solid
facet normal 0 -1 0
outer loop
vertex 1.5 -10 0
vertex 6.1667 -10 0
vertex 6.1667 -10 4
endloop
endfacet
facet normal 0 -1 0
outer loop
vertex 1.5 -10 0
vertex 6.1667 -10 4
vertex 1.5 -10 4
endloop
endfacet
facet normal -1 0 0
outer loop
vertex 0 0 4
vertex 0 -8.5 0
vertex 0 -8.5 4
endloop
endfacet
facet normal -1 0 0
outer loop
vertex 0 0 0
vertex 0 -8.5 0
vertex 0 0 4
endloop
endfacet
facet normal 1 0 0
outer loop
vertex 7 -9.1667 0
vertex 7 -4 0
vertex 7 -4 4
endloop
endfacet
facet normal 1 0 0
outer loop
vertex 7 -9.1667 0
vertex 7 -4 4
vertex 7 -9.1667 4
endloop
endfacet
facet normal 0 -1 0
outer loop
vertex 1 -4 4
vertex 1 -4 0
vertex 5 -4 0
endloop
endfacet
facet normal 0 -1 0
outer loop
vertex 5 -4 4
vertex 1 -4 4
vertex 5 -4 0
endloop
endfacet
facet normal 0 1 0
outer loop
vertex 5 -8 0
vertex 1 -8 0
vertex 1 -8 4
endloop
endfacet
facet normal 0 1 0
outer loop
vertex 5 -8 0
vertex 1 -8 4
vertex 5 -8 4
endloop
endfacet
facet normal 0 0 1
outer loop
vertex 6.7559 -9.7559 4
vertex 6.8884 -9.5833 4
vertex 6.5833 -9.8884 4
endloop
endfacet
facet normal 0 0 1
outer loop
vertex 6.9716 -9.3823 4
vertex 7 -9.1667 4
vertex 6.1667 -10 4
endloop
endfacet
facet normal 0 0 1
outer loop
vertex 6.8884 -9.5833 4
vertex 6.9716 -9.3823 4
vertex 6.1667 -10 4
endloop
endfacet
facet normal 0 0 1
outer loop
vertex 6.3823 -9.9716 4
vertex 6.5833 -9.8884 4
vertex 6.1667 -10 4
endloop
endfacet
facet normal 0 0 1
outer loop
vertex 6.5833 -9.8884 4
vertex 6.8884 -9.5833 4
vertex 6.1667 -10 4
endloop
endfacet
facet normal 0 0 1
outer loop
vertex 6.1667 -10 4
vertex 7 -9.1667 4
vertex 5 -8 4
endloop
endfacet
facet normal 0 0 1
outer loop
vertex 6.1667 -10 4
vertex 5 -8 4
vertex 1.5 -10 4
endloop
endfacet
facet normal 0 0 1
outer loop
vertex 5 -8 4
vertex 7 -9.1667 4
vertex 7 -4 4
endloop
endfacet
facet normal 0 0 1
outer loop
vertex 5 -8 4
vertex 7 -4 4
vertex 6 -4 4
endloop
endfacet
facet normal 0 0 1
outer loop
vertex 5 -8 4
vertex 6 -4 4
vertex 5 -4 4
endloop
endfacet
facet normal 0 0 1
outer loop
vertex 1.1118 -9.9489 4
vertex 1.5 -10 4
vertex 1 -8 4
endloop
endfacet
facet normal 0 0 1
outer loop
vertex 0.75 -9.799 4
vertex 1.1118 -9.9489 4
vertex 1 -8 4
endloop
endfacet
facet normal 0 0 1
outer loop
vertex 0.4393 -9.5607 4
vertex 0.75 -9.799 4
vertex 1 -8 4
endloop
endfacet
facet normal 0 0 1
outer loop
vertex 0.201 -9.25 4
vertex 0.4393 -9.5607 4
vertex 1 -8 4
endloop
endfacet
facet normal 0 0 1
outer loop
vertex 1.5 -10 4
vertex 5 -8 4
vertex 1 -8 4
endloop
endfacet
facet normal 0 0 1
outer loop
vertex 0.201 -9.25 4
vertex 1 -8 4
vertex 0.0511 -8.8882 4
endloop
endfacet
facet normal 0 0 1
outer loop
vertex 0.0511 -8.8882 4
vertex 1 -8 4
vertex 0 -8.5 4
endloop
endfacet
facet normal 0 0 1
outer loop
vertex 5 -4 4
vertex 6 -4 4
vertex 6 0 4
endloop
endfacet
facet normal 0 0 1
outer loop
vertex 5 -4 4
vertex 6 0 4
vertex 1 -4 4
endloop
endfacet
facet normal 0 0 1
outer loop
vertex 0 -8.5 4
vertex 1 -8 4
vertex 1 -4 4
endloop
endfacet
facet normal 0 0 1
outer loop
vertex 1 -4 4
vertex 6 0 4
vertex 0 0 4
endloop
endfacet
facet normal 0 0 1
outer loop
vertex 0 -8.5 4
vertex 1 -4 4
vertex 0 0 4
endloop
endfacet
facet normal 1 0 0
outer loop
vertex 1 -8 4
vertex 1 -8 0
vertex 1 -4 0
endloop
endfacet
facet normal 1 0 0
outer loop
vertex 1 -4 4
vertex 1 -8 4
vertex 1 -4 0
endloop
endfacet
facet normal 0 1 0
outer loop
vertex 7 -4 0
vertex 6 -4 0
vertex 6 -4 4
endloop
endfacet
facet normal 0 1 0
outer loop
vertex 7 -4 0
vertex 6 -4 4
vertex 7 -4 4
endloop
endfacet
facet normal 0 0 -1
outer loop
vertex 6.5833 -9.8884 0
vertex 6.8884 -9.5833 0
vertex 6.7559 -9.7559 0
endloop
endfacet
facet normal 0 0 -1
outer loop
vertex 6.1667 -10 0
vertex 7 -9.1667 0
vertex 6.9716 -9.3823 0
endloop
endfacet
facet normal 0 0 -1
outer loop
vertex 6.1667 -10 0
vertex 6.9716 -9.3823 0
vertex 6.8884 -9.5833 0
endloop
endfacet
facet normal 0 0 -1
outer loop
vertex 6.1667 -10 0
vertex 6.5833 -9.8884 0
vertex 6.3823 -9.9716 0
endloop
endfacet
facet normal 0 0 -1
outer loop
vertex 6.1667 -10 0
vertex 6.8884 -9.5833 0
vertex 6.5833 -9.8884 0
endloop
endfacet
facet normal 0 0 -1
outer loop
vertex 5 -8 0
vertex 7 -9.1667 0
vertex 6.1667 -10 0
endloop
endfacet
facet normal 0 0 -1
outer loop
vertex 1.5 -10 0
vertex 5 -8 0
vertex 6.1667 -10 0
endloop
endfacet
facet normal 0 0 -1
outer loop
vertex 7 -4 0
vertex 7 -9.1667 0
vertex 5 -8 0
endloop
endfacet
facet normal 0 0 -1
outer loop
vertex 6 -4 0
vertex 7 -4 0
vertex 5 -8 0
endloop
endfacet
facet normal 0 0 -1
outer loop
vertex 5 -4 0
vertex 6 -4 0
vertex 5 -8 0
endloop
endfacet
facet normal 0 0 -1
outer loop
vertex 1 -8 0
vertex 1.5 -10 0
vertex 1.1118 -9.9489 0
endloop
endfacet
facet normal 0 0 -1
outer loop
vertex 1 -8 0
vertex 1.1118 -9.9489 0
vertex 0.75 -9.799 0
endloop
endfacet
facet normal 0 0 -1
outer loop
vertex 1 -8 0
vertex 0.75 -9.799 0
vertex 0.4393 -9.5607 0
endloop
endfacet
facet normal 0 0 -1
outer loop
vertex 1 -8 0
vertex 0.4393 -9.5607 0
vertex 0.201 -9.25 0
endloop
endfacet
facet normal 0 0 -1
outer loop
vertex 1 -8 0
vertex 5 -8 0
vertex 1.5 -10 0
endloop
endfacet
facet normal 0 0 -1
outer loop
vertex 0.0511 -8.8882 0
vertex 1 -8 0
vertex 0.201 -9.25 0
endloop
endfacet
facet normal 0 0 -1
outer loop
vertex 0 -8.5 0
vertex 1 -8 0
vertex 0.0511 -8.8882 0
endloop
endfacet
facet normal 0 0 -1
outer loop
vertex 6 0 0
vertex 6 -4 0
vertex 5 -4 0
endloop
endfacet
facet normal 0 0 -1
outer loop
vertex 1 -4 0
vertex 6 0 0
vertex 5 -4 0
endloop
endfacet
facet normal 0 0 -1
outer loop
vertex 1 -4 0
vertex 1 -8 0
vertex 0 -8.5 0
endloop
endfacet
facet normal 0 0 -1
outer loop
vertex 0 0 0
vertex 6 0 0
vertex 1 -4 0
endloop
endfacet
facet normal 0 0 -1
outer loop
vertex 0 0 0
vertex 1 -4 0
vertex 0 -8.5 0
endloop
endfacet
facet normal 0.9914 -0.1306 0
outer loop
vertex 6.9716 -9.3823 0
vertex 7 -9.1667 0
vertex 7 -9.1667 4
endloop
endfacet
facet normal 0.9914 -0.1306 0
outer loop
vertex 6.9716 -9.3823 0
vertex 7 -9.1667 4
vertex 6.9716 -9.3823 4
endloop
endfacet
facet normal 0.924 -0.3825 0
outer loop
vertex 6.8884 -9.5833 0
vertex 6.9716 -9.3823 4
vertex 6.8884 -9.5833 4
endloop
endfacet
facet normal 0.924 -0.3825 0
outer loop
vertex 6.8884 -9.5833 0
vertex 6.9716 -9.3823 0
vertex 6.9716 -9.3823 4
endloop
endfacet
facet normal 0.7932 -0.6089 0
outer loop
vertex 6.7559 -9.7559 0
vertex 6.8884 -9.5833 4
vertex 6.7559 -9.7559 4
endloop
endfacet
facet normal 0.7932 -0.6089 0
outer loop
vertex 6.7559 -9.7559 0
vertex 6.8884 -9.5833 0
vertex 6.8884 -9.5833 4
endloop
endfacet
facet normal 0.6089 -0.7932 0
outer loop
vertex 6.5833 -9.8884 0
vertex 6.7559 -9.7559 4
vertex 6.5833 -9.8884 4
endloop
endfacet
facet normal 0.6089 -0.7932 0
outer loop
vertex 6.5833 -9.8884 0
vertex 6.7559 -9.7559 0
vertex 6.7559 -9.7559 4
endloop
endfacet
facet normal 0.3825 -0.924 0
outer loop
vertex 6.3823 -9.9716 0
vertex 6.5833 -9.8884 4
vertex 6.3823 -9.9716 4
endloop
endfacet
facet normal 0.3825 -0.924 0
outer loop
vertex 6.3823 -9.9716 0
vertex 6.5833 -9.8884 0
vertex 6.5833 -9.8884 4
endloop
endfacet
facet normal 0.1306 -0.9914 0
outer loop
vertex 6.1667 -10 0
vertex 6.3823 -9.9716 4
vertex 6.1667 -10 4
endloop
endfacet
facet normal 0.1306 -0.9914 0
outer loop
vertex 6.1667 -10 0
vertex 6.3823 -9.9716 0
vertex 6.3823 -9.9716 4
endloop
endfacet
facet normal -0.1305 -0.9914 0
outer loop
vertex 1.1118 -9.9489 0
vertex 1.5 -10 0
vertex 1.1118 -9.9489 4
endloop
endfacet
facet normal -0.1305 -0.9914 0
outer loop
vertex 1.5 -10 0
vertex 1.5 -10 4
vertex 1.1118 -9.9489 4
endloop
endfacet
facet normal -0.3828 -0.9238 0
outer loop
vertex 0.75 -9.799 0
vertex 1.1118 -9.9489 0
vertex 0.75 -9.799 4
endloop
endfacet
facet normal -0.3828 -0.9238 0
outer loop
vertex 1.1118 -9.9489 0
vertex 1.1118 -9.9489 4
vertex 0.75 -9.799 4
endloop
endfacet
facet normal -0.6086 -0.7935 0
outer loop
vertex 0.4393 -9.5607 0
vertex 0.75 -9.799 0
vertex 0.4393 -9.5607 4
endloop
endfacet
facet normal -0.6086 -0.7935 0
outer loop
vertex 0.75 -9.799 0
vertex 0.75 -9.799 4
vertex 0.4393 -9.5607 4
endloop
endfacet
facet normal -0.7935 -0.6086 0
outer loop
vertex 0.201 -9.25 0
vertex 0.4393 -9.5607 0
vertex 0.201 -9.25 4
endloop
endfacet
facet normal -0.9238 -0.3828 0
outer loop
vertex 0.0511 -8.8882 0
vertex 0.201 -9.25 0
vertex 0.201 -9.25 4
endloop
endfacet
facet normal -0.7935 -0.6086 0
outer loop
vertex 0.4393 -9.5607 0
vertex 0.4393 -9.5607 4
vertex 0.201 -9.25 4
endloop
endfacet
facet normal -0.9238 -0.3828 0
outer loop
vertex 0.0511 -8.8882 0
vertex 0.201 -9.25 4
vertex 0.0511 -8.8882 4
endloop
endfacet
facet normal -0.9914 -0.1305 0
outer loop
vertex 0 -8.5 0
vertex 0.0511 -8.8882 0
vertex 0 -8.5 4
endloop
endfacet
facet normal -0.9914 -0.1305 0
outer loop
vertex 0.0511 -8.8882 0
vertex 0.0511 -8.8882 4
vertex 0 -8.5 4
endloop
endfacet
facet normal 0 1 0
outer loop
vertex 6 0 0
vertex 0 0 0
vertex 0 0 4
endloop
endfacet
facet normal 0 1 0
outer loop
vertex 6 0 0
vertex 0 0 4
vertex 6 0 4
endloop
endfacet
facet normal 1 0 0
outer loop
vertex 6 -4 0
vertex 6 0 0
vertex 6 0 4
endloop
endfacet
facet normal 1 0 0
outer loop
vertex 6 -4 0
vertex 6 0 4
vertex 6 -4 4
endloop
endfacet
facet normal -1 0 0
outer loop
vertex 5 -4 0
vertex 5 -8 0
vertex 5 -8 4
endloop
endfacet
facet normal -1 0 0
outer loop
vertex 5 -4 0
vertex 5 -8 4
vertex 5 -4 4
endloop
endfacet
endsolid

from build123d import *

# Parameters (mm, degrees)
ESQUISSE1_W             = 4
ESQUISSE1_H             = 4
BOSS_EXTRU_1_DEPTH      = 4
ENL_V_MAT_EXTRU_1_REACH = 14.845
CONG_2_R                = 1.5


with BuildPart() as part:
    # Esquisse1 → Boss.-Extru.1 (new body)
    with BuildSketch(Plane.XY):
        with BuildLine():
            Line((0, 0), (6, 0))
            Line((6, 0), (6, -4))
            Line((6, -4), (7, -4))
            Line((7, -4), (7, -9.166666667))
            ThreePointArc((7, -9.166666667), (6.755922318, -9.755922318), (6.166666667, -10))
            Line((6.166666667, -10), (-0.166666667, -10))
            ThreePointArc((-0.166666667, -10), (-0.755922318, -9.755922318), (-1, -9.166666667))
            Line((-1, -9.166666667), (-1, -4))
            Line((-1, -4), (0, -4))
            Line((0, -4), (0, 0))
        make_face()
        with Locations((3, -6)):
            Rectangle(ESQUISSE1_W, ESQUISSE1_H, mode=Mode.SUBTRACT)
    extrude(amount=BOSS_EXTRU_1_DEPTH)

    # Esquisse2 → Enlèv. mat.-Extru.1 (cut, up to next)
    with BuildSketch(Plane.XY.offset(4), mode=Mode.PRIVATE) as enl_v_mat_extru_1_sk1:
        Polygon((0, 0), (0, -10.686908442), (-3.147637421, -9.875475315), (-3.03761259, -0.798426774), align=None)
    enl_v_mat_extru_1_tool1 = extrude(enl_v_mat_extru_1_sk1.sketch, amount=-ENL_V_MAT_EXTRU_1_REACH, mode=Mode.PRIVATE) & part.part
    add(enl_v_mat_extru_1_tool1.solids().sort_by_distance((-1.504511, -5.371974, 4))[0], mode=Mode.SUBTRACT)

    # Congé2
    cong_2_edges = [part.edges().sort_by_distance(p)[0] for p in [
        (0, -10, 2),
    ]]
    fillet(cong_2_edges, radius=CONG_2_R)


solid = part.part
